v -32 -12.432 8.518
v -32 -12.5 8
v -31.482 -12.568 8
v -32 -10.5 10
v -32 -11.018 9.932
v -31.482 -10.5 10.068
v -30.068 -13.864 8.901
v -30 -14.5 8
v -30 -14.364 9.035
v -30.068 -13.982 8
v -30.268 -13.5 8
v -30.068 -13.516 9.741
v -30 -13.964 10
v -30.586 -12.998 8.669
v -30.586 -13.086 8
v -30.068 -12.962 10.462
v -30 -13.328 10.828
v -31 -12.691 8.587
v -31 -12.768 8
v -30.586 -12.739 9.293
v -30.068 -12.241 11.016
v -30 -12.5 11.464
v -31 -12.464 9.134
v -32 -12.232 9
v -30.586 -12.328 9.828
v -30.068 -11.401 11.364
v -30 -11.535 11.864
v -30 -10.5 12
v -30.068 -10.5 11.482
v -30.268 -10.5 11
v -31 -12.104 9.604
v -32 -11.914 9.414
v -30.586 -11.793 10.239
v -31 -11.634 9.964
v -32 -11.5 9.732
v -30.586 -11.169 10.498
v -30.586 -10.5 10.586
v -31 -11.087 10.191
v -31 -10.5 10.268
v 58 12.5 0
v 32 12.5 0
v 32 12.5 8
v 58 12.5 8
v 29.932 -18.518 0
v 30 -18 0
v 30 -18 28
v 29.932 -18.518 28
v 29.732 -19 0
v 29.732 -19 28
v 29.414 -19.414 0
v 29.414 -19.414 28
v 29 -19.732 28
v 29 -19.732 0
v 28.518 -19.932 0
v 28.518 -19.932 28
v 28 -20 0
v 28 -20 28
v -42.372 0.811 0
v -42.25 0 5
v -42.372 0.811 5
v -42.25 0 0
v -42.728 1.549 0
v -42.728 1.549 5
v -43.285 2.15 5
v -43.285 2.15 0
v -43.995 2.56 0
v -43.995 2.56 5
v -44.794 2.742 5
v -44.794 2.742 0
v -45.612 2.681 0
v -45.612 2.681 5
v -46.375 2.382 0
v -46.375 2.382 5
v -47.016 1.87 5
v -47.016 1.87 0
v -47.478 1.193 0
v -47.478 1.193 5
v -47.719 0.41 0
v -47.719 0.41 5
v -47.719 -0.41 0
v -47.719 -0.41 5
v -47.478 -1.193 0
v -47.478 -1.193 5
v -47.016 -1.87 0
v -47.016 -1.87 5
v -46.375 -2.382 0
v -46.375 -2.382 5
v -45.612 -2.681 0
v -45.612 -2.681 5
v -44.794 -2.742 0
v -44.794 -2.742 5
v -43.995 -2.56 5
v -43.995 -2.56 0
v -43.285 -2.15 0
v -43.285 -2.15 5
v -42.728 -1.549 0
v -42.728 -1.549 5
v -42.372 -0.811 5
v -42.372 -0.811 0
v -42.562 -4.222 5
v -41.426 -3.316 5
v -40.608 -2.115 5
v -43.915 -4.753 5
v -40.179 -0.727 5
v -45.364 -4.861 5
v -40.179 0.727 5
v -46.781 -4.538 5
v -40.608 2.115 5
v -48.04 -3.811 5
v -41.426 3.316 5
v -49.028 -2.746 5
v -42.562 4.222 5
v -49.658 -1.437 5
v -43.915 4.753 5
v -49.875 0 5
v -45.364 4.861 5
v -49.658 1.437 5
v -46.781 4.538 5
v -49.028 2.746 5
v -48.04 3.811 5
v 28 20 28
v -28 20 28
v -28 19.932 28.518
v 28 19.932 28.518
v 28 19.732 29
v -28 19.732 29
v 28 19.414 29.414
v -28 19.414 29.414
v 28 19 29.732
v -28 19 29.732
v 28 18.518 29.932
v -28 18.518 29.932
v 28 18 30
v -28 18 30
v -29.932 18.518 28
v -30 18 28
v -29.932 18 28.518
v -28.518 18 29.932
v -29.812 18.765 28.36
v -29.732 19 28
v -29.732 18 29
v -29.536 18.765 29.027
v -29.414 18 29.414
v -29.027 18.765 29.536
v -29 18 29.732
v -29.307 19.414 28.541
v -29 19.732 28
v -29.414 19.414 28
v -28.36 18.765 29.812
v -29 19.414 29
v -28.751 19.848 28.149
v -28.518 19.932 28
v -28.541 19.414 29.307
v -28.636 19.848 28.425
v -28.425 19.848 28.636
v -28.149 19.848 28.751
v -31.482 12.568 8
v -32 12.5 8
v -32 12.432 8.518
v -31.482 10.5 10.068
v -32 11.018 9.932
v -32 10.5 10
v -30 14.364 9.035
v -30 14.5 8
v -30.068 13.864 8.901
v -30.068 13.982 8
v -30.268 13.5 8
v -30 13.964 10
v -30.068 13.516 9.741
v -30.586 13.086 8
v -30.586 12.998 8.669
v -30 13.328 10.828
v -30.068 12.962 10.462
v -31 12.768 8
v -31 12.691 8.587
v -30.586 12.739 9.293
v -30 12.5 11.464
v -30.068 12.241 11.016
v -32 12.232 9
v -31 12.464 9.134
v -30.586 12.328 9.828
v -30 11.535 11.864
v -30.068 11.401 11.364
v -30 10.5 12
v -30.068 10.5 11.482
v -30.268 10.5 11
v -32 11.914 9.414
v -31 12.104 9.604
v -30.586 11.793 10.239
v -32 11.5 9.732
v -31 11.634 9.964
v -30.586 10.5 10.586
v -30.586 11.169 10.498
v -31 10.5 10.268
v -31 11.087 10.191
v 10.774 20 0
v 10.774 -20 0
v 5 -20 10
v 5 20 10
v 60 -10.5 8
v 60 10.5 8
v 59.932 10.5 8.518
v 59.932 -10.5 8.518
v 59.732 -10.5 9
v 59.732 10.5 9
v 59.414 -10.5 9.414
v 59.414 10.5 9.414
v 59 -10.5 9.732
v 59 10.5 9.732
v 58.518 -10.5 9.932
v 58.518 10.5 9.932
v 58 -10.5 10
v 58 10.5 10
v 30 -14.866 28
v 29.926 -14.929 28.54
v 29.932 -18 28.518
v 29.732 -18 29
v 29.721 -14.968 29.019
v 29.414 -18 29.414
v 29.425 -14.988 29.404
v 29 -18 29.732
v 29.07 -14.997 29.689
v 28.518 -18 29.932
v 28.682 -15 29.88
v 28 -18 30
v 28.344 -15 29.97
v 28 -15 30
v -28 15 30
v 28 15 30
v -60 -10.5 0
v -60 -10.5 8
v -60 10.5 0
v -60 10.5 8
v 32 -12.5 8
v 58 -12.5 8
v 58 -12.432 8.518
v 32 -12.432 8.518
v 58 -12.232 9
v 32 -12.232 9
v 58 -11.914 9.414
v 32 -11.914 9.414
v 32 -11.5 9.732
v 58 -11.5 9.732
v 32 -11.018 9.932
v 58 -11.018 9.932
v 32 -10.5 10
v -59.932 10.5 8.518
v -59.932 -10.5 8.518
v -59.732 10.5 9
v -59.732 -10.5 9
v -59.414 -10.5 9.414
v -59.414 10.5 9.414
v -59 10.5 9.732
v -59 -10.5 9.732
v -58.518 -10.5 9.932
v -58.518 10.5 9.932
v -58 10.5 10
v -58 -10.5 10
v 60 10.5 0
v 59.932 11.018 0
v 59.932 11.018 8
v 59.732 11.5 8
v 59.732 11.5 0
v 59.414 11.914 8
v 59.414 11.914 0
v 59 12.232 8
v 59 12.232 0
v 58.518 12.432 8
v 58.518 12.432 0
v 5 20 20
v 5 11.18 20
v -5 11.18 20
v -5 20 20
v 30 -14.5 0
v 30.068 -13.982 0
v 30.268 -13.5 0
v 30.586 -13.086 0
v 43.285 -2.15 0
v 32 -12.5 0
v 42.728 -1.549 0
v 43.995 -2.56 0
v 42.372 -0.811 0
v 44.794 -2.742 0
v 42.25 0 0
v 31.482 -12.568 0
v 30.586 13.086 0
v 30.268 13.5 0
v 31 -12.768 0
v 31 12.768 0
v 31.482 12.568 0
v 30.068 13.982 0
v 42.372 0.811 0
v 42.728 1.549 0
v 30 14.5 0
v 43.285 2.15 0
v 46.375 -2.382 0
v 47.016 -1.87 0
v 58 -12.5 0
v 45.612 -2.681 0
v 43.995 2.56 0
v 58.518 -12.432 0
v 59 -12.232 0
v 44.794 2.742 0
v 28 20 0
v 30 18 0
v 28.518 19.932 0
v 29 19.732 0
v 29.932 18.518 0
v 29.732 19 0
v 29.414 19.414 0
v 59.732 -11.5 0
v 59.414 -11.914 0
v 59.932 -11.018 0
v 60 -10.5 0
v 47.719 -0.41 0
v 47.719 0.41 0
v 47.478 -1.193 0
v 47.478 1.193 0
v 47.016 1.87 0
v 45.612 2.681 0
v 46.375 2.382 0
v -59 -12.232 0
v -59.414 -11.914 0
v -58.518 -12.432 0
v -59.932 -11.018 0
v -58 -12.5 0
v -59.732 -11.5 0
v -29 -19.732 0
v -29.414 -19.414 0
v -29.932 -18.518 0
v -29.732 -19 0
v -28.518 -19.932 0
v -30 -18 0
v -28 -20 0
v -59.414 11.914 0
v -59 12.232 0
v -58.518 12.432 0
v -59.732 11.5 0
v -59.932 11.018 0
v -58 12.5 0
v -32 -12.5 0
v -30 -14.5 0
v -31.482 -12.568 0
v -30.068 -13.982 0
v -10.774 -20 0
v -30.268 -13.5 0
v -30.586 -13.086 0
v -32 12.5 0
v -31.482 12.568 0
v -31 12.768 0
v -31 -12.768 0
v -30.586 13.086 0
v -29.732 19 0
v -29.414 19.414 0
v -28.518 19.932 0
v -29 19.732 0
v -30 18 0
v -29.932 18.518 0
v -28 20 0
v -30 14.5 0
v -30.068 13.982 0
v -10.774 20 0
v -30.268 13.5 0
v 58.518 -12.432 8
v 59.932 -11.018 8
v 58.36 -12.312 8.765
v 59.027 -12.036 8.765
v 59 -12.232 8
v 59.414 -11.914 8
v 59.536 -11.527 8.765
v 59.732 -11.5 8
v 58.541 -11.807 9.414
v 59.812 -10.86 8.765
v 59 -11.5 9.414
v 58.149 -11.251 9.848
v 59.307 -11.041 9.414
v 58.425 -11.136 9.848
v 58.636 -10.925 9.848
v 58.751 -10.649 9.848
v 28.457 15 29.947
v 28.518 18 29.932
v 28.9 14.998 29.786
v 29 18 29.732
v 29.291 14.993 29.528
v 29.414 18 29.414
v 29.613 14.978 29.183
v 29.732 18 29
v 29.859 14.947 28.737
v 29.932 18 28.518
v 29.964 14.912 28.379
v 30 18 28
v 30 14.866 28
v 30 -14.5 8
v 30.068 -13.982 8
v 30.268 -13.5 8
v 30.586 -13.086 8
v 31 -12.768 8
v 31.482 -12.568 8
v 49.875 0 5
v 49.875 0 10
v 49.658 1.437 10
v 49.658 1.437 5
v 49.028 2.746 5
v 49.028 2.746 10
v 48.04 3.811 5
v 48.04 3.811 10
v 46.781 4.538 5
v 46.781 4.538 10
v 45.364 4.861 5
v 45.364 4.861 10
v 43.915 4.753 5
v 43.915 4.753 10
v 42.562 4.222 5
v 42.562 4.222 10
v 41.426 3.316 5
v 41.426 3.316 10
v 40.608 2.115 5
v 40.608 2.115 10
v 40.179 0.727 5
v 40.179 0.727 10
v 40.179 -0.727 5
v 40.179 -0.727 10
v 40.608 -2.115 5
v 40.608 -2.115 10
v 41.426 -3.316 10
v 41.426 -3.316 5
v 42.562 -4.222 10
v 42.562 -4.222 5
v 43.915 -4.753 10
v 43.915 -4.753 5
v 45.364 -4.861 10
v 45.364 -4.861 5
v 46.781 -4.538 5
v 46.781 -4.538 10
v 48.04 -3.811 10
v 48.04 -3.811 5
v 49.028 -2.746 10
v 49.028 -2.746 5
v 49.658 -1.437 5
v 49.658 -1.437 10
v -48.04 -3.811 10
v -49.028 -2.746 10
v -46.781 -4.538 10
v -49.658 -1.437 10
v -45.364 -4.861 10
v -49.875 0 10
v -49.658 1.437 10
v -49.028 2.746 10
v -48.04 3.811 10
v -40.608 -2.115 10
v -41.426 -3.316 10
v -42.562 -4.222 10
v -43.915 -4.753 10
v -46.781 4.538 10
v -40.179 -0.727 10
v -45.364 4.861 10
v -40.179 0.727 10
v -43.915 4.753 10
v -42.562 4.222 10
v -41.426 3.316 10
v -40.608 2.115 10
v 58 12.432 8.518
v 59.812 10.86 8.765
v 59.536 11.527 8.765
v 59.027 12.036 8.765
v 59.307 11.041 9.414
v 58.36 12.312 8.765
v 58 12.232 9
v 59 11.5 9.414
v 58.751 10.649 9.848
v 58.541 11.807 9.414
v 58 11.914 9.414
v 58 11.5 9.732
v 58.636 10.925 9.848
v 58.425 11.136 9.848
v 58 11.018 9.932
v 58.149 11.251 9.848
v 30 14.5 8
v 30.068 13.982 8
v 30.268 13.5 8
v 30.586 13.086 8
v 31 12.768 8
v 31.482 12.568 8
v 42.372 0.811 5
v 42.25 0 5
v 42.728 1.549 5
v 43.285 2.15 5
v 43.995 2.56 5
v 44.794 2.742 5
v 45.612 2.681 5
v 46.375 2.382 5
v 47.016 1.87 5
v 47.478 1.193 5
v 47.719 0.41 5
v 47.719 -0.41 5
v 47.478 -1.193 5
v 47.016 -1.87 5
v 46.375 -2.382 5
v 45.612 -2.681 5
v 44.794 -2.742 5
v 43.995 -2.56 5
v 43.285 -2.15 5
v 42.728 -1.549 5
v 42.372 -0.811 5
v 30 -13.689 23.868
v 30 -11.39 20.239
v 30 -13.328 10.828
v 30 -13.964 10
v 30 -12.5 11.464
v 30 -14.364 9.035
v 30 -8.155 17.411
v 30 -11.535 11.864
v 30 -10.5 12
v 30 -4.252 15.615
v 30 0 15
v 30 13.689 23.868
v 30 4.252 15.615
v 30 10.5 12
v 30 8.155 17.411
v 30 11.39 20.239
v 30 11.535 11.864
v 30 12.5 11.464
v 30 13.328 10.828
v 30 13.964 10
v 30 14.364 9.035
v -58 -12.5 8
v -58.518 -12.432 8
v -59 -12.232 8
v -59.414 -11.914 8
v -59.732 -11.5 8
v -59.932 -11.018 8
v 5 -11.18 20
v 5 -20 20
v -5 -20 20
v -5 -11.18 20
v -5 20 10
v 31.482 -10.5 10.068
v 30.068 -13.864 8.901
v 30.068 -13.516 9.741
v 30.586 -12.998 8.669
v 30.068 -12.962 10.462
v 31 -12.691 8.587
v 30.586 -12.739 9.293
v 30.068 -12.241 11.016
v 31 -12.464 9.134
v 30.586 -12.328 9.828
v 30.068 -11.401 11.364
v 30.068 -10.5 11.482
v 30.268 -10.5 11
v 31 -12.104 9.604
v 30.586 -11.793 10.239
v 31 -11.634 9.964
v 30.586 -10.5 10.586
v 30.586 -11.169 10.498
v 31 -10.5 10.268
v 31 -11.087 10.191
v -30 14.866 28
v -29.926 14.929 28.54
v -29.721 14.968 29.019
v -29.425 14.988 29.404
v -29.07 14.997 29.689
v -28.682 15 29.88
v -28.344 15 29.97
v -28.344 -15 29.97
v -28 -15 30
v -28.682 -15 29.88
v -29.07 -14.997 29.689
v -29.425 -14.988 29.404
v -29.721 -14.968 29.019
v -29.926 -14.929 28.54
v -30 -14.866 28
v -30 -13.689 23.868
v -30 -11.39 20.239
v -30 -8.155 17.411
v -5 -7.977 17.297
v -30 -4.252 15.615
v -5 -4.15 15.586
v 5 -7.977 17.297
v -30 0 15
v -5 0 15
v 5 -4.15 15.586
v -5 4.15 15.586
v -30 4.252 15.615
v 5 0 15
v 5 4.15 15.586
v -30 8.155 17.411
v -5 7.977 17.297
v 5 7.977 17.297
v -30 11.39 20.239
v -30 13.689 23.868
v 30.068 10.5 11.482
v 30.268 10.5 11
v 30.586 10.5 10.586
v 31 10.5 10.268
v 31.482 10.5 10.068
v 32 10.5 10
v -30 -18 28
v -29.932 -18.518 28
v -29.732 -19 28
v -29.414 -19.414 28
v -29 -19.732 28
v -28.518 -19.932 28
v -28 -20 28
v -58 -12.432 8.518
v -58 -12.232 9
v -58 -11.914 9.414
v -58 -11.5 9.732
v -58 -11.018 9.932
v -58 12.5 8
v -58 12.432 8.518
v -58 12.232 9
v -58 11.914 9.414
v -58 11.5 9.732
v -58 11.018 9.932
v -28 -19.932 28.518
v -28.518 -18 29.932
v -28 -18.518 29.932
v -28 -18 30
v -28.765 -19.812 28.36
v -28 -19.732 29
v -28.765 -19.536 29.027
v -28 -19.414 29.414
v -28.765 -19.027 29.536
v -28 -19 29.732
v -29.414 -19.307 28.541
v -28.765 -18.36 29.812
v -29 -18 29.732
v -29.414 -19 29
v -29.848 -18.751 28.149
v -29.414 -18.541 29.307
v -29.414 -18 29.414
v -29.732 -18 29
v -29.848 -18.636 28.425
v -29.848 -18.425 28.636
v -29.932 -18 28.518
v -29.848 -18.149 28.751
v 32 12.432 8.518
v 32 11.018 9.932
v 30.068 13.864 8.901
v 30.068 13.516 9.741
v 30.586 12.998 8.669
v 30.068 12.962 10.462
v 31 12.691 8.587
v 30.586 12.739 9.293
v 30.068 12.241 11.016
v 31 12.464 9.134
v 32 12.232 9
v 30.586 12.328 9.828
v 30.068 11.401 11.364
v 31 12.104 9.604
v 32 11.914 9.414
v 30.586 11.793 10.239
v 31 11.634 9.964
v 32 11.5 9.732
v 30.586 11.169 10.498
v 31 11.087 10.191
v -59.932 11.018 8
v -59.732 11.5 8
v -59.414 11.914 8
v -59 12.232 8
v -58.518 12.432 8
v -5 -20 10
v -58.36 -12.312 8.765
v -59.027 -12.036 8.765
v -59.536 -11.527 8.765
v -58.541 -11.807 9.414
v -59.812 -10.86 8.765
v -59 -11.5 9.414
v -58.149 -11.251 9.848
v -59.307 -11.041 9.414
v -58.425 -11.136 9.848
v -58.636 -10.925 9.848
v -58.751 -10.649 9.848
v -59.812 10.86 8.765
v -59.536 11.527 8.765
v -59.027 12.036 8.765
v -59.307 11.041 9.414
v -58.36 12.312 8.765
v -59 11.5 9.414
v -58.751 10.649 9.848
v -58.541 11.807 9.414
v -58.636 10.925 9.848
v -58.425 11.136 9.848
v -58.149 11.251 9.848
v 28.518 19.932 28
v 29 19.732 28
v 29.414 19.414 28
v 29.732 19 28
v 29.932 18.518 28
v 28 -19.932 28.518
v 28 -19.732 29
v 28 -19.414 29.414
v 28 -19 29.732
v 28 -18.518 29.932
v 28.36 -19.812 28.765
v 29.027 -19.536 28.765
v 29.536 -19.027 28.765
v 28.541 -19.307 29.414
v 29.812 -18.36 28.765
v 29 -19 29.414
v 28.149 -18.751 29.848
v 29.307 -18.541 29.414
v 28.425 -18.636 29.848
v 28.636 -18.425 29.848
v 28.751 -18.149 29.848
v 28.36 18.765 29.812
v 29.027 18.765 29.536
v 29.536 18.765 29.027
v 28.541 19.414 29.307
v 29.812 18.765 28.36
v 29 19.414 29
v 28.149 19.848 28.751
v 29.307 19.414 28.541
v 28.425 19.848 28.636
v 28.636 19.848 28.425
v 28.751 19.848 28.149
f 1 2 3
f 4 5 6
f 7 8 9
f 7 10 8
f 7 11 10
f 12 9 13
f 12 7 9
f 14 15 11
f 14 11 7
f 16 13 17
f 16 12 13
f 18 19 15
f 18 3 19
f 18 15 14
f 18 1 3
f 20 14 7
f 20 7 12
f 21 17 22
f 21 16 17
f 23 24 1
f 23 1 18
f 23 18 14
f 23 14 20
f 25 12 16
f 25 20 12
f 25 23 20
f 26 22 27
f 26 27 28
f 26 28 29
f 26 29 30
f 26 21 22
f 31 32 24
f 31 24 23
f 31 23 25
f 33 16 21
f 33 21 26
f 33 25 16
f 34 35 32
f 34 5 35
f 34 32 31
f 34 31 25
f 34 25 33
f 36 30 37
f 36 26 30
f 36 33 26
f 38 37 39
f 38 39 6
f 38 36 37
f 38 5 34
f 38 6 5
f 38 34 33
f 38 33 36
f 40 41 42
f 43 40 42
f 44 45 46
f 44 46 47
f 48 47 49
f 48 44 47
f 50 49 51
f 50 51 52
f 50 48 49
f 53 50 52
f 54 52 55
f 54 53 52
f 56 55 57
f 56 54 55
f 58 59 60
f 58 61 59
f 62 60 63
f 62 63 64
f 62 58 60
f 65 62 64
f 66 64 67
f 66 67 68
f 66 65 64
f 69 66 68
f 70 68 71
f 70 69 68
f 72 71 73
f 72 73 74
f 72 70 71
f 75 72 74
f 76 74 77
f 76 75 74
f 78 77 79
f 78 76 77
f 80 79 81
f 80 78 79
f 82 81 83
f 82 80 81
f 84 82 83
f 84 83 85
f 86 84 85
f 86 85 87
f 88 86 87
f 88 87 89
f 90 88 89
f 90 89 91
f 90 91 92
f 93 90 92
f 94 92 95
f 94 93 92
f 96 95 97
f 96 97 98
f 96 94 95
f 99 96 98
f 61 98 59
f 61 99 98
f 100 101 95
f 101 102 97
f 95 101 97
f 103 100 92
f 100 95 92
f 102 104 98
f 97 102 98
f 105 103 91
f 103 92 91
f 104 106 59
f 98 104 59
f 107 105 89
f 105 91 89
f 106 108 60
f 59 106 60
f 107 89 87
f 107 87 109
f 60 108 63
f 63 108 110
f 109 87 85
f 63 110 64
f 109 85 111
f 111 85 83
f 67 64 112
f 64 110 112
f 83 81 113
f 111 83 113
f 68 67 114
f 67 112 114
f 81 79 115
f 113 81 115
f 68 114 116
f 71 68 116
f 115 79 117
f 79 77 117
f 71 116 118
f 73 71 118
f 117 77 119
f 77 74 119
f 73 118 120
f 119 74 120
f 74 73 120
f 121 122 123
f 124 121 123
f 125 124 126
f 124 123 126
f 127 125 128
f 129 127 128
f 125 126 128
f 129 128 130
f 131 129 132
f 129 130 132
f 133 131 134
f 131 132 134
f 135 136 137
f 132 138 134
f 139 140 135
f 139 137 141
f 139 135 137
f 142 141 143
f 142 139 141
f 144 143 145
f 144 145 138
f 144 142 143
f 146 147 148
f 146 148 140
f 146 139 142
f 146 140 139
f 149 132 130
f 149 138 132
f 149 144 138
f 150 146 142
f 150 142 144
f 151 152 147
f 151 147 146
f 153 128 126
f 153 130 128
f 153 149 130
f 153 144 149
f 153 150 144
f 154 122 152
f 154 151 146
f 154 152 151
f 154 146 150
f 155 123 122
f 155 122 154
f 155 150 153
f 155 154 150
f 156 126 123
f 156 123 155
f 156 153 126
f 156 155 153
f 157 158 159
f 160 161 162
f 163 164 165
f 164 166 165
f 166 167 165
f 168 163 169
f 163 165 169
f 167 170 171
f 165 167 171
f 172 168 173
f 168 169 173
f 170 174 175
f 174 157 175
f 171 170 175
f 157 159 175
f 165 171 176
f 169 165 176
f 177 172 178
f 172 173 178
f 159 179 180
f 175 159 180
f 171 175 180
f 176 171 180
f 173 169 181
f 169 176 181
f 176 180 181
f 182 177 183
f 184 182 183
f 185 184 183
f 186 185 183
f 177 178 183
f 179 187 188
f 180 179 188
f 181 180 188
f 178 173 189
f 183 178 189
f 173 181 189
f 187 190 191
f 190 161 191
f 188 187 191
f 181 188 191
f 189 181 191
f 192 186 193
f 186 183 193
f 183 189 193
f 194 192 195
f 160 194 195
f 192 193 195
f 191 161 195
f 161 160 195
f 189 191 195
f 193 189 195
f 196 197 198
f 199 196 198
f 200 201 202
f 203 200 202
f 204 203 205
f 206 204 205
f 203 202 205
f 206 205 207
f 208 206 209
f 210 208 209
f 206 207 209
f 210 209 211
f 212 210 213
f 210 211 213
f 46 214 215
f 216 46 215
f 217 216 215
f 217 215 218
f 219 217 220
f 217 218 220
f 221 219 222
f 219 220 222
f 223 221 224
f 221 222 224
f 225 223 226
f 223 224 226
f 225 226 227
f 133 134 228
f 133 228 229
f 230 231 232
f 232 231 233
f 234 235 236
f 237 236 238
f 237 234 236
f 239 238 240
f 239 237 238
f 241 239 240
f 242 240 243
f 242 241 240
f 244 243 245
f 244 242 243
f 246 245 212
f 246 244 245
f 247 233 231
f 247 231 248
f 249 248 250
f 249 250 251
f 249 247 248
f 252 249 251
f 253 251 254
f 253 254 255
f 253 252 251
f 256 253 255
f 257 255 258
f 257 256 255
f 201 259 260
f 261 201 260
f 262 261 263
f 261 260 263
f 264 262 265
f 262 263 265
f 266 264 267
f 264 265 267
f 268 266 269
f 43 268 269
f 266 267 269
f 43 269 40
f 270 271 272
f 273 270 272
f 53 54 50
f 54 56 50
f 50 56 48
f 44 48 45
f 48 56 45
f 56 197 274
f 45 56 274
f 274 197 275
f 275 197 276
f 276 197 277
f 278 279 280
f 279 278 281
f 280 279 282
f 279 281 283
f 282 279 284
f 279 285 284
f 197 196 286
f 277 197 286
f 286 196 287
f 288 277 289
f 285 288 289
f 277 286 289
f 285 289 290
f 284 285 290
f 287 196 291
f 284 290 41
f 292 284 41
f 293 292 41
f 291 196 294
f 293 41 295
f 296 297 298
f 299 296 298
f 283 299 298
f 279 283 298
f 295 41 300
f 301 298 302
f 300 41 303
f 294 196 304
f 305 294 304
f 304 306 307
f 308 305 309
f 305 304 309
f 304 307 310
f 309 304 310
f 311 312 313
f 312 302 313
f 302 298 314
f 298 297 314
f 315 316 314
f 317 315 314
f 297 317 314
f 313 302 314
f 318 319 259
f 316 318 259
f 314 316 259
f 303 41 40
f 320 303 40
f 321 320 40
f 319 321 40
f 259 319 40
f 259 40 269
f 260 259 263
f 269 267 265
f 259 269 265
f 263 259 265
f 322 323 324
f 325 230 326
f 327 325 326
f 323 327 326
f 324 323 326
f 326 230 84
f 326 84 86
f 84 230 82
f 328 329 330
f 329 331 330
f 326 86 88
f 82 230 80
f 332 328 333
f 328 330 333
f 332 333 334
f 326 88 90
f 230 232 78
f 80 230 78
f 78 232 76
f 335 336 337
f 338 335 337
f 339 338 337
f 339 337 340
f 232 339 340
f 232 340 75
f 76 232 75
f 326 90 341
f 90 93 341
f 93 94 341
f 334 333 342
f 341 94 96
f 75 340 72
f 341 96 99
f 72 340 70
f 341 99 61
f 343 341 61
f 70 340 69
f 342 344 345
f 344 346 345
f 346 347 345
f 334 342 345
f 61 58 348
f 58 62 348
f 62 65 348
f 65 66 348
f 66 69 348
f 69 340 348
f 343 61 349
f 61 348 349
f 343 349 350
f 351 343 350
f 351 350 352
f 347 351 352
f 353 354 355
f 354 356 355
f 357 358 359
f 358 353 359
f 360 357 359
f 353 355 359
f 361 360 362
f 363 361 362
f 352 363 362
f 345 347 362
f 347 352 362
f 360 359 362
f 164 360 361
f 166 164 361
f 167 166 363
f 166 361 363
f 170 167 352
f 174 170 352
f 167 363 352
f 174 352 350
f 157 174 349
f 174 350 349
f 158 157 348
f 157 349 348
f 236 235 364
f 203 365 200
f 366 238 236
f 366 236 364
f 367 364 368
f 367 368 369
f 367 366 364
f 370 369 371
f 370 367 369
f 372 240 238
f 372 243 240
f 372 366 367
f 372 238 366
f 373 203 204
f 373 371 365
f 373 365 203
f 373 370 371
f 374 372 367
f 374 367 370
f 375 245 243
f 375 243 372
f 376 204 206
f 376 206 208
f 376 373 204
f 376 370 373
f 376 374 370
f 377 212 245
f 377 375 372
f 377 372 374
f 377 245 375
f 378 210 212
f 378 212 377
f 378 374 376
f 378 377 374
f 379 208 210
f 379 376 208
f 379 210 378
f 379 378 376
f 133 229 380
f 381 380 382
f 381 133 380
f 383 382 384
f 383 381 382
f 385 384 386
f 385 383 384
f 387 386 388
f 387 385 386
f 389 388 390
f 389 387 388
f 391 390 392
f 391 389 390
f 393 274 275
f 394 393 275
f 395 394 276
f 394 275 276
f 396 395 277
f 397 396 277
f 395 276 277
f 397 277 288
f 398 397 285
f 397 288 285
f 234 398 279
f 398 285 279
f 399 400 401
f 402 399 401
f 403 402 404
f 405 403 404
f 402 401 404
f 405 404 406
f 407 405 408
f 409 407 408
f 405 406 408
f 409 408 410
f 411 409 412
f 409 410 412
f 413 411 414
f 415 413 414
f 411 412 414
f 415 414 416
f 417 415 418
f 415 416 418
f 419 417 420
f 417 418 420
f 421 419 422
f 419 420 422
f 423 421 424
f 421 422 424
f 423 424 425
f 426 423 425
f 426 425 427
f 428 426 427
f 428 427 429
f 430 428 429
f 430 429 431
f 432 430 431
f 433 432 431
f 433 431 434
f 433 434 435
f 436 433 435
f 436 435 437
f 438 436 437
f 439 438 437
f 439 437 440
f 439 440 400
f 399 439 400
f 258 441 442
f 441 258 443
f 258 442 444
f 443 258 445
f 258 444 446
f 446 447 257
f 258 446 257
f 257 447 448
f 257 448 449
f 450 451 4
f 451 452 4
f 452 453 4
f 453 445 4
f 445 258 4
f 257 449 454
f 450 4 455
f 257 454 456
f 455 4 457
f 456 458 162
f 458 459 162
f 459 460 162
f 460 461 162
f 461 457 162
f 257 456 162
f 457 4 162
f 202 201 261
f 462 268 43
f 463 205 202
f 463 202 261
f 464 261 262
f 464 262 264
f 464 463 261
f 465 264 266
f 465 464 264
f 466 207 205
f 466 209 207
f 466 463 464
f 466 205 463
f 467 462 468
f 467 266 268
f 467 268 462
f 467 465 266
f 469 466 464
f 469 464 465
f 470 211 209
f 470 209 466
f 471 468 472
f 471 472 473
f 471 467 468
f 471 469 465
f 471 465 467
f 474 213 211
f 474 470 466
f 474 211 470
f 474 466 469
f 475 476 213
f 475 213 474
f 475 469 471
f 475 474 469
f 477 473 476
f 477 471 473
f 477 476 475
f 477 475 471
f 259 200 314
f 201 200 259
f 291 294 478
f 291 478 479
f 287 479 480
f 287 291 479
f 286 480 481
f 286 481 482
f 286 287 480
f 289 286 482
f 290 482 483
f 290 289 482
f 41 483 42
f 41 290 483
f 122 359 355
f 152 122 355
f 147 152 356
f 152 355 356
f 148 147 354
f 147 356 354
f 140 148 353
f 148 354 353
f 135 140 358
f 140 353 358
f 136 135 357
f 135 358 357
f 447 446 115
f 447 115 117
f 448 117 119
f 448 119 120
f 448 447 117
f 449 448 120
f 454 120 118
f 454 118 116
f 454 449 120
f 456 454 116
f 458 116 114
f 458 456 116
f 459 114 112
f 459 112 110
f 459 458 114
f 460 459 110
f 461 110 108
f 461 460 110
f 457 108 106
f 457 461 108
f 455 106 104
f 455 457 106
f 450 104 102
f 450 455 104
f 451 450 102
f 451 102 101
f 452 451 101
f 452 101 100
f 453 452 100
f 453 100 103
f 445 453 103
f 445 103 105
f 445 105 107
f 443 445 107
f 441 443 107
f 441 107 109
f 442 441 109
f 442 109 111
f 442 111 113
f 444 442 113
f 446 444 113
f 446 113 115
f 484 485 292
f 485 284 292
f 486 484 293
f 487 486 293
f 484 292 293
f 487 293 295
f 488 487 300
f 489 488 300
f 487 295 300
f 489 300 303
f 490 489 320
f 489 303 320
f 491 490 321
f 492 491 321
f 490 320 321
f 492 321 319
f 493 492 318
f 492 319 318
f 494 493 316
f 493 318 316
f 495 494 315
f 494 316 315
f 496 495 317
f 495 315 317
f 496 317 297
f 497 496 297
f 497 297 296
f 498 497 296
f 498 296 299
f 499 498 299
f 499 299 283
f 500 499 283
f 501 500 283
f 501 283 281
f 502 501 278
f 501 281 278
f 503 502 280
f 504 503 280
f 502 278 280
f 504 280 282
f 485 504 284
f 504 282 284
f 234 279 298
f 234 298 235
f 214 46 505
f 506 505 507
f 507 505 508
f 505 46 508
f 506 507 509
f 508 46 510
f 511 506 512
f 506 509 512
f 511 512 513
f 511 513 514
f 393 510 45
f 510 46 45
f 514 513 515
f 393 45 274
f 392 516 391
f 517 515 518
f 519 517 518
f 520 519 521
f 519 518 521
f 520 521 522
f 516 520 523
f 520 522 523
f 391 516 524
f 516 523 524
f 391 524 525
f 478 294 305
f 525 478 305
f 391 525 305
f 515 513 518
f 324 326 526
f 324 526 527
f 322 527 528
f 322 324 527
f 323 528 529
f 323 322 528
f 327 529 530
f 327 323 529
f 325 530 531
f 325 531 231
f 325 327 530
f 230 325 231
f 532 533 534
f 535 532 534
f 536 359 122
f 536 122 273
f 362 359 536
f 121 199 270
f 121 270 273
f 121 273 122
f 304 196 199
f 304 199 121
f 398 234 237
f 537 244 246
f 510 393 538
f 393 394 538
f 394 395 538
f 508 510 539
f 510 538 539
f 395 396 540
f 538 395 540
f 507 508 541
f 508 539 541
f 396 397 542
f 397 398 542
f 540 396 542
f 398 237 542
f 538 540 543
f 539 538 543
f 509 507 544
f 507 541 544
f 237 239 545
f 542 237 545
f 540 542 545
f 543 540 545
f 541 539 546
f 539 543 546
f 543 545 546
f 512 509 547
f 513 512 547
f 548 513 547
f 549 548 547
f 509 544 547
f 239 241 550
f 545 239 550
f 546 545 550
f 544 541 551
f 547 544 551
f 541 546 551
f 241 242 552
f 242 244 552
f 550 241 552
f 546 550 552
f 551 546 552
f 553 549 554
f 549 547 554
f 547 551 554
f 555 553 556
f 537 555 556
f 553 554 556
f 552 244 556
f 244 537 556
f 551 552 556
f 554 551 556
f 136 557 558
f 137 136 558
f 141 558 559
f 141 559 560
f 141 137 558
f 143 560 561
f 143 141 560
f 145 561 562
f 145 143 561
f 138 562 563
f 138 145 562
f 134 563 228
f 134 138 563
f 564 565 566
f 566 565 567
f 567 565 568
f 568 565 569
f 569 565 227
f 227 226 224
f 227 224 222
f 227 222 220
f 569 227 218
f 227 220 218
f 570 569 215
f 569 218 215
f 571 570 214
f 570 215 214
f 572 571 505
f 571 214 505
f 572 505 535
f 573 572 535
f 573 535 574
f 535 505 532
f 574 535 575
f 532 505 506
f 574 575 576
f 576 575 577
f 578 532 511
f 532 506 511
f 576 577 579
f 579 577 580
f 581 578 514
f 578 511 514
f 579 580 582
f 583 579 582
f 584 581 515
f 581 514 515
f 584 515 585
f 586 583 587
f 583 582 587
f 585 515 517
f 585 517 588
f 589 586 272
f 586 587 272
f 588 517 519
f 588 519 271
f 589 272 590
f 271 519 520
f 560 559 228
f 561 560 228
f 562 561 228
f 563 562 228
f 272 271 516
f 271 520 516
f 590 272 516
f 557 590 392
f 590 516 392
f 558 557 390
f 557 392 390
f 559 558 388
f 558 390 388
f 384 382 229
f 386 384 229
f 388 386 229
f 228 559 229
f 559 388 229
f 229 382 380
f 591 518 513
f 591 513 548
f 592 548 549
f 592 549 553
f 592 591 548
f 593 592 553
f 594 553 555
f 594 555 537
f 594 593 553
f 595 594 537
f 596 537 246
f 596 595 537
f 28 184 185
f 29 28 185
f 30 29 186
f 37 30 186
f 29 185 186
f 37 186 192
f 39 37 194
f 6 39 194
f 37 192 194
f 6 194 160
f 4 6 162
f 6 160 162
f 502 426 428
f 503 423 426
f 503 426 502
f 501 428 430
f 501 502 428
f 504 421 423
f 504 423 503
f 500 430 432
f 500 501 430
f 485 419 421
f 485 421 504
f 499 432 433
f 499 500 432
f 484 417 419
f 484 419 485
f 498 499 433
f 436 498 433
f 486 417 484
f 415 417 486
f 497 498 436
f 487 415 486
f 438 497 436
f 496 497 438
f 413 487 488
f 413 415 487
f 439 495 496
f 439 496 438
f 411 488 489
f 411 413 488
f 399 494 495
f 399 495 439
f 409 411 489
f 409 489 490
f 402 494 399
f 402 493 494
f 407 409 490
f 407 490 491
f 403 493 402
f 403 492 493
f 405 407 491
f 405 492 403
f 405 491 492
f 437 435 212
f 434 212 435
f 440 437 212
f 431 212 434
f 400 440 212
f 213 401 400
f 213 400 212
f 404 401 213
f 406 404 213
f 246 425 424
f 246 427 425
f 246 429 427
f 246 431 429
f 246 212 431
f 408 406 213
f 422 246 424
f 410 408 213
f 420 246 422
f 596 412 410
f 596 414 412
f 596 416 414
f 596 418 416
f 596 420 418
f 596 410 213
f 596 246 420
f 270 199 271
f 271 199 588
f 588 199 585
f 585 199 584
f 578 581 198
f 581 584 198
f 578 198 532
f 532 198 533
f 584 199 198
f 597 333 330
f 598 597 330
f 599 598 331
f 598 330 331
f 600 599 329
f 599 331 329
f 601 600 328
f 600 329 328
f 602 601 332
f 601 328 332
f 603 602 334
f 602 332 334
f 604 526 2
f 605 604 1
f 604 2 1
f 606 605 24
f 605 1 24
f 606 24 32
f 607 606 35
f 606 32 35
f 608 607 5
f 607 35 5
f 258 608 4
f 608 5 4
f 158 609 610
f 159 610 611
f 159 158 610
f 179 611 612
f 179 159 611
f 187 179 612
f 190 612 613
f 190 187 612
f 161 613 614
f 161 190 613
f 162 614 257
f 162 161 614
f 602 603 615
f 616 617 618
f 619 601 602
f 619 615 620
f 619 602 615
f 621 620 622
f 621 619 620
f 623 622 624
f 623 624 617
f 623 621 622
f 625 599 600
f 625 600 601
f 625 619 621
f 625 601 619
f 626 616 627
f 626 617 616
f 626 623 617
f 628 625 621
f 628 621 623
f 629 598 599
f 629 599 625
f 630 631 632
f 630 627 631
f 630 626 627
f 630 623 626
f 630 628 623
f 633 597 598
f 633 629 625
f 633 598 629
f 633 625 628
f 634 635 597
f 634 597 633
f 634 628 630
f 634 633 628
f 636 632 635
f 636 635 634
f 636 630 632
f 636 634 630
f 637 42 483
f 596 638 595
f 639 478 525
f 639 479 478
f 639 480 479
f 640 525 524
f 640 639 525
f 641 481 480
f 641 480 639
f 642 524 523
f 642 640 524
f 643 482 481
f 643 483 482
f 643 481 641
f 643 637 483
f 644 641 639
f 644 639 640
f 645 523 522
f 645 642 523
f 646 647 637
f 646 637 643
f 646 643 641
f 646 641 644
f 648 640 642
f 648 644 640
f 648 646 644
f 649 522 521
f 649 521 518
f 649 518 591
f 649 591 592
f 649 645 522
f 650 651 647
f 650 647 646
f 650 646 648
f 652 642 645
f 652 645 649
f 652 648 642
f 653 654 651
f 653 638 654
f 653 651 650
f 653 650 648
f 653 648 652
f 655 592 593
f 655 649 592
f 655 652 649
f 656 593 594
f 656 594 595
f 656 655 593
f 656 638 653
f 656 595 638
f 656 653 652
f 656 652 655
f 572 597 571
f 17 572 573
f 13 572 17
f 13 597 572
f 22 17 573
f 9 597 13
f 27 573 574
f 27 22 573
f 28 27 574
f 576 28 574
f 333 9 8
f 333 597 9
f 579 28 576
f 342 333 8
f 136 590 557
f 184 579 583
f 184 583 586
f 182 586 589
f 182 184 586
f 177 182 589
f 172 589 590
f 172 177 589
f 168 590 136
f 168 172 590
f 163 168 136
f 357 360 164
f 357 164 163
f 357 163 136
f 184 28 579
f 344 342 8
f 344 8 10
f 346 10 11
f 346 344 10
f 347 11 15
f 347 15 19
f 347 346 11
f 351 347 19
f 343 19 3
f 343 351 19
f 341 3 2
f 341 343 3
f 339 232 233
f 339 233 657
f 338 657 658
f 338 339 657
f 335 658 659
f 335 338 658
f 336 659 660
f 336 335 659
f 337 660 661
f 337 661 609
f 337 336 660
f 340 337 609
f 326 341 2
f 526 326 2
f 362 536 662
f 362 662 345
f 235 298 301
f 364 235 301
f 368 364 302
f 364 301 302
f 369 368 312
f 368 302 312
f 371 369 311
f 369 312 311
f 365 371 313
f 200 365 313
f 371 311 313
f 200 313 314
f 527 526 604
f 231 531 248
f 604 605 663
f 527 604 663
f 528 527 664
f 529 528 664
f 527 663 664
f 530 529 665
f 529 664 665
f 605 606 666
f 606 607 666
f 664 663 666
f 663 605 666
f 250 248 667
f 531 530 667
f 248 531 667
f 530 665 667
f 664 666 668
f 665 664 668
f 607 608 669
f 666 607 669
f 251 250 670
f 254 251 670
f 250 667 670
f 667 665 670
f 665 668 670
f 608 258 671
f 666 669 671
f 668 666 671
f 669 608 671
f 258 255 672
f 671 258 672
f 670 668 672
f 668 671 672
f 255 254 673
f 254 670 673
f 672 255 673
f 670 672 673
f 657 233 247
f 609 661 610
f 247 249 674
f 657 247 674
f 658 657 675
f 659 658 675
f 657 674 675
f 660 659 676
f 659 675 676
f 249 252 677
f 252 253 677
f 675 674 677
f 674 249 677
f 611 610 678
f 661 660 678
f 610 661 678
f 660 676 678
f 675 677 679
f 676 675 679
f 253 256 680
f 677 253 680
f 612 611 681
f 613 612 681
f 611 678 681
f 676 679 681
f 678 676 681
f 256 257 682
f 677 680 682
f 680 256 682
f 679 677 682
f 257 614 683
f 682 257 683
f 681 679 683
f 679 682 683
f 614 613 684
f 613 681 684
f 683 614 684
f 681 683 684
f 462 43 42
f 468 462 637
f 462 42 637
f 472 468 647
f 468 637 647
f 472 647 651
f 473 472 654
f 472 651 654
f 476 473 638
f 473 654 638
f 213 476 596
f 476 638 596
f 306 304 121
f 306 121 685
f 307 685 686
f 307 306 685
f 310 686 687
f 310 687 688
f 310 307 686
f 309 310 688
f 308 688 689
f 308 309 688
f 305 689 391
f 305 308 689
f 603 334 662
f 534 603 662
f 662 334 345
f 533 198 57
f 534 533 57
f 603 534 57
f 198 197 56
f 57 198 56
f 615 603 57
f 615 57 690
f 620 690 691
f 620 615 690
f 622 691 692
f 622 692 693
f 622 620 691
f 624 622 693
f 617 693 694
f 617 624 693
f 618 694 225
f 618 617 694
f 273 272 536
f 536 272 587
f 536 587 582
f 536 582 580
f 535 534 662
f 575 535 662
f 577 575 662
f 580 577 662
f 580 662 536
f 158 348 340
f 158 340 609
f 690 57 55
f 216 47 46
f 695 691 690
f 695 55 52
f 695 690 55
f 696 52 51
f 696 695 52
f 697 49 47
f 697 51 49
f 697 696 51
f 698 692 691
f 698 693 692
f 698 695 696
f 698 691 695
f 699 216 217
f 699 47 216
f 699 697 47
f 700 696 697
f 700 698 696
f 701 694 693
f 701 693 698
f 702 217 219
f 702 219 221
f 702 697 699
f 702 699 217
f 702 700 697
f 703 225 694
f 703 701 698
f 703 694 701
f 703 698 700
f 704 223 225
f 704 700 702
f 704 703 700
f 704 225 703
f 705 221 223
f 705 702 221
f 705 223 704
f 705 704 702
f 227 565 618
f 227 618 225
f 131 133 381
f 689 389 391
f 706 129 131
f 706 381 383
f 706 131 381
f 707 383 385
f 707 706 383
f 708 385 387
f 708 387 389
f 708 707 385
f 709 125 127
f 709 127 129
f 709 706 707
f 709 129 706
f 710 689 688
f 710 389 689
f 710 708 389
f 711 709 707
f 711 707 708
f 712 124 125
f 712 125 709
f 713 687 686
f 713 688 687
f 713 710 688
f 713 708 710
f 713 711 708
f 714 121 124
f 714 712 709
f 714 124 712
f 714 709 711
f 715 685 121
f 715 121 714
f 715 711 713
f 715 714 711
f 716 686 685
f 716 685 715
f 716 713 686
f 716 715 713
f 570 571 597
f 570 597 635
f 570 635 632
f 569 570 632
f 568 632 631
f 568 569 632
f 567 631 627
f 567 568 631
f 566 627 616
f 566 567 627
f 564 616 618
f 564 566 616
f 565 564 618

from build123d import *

# Parameters (mm, degrees)
F0_W           = 60
F0_H           = 40
F1_DEPTH       = 30
F3_DEPTH       = 40.001
F4_R           = 15
F5_DEPTH       = 40
F6_W           = 25
F6_H           = 10
F7_DEPTH       = 30
F9_D           = 5.5
F9_CBORE_D     = 9.75
F9_CBORE_DEPTH = 5
F10_T1_DEPTH   = 13
F10_T3_DEPTH   = 28
F10_T5_DEPTH   = 21
F10_T7_DEPTH   = 33
F10_T9_DEPTH   = 8
F10_T11_DEPTH  = 56
F10_T13_DEPTH  = 8
F10_S17_W      = 2
F10_S17_H      = 2
F10_T18_DEPTH  = 2
F10_S23_W      = 2
F10_S23_H      = 2
F10_T24_DEPTH  = 2
F10_S29_W      = 2
F10_S29_H      = 2
F10_T30_DEPTH  = 2
F10_S35_W      = 2
F10_S35_H      = 2
F10_T36_DEPTH  = 2
F10_S41_W      = 2
F10_S41_H      = 2
F10_T42_DEPTH  = 2
F10_S47_W      = 2
F10_S47_H      = 2
F10_T48_DEPTH  = 2
F10_T51_DEPTH  = 8
F10_T53_DEPTH  = 21
F10_T56_ANGLE  = 90
F10_T58_ANGLE  = 90


# Not quite as in the source:
# - a fillet or chamfer that OpenCascade refuses, or shapes differently, is made with other operations: its cross-section is extruded or revolved along the edge and cut away or added


with BuildPart() as f1:
    # F0 (on Top) → F1 (new body)
    with BuildSketch(Plane.XY):
        Rectangle(F0_W, F0_H)
    extrude(amount=F1_DEPTH)

    # F2 (on face) → F3 (cut, through all)
    with BuildSketch(Plane.XZ.offset(20)):
        Polygon((-5, 10), (-10.7735026919, 0), (10.7735026919, 0), (5, 10), (5, 20), (-5, 20), align=None)
    extrude(amount=-F3_DEPTH, mode=Mode.SUBTRACT)

    # F4 (on Right) → F5 (cut, symmetric)
    with BuildSketch(Plane.YZ):
        with Locations((0, 30)):
            Circle(F4_R)
    extrude(amount=F5_DEPTH, both=True, mode=Mode.SUBTRACT)

    # F6 (on face) → F7 (join)
    with BuildSketch(Plane.YZ.offset(30)):
        with Locations((0, 5)):
            Rectangle(F6_W, F6_H)
    extrude(amount=F7_DEPTH)

    # F9 (through all)
    with Locations(Plane.XY.offset(10)):
        with Locations((45, 0)):
            CounterBoreHole(F9_D / 2, F9_CBORE_D / 2, F9_CBORE_DEPTH)

    # F10: fillet of radius 2 on 18 edges, made by hand

    # F10_s2 → F10_t1 (cut)
    with BuildSketch(Plane.XY.offset(-5)):
        with BuildLine():
            ThreePointArc((58, -12.5), (59.4142135624, -11.9142135624), (60, -10.5))
            Line((60, -10.5), (60, -12.5))
            Line((60, -12.5), (58, -12.5))
        make_face()
        with BuildLine():
            ThreePointArc((60, 10.5), (59.4142135624, 11.9142135624), (58, 12.5))
            Line((58, 12.5), (60, 12.5))
            Line((60, 12.5), (60, 10.5))
        make_face()
    extrude(amount=F10_T1_DEPTH, mode=Mode.SUBTRACT)

    # F10_s4 → F10_t3 (cut)
    with BuildSketch(Plane.YZ.offset(30)):
        with BuildLine():
            ThreePointArc((-12.5, 8), (-11.9142135624, 9.4142135624), (-10.5, 10))
            Line((-10.5, 10), (-12.5, 10))
            Line((-12.5, 10), (-12.5, 8))
        make_face()
        with BuildLine():
            ThreePointArc((12.5, 8), (11.9142135624, 9.4142135624), (10.5, 10))
            Line((10.5, 10), (12.5, 10))
            Line((12.5, 10), (12.5, 8))
        make_face()
    extrude(amount=F10_T3_DEPTH, mode=Mode.SUBTRACT)

    # F10_s6 → F10_t5 (cut)
    with BuildSketch(Plane.XZ.offset(-10.5)):
        with BuildLine():
            ThreePointArc((60, 8), (59.4142135624, 9.4142135624), (58, 10))
            Line((58, 10), (60, 10))
            Line((60, 10), (60, 8))
        make_face()
    extrude(amount=F10_T5_DEPTH, mode=Mode.SUBTRACT)

    # F10_s8 → F10_t7 (cut)
    with BuildSketch(Plane.XY.offset(-5)):
        with BuildLine():
            ThreePointArc((30, -18), (29.4142135624, -19.4142135624), (28, -20))
            Line((28, -20), (30, -20))
            Line((30, -20), (30, -18))
        make_face()
        with BuildLine():
            ThreePointArc((28, 20), (29.4142135624, 19.4142135624), (30, 18))
            Line((30, 18), (30, 20))
            Line((30, 20), (28, 20))
        make_face()
        with BuildLine():
            ThreePointArc((-30, -18), (-29.4142135624, -19.4142135624), (-28, -20))
            Line((-28, -20), (-30, -20))
            Line((-30, -20), (-30, -18))
        make_face()
        with BuildLine():
            ThreePointArc((-28, 20), (-29.4142135624, 19.4142135624), (-30, 18))
            Line((-30, 18), (-30, 20))
            Line((-30, 20), (-28, 20))
        make_face()
    extrude(amount=F10_T7_DEPTH, mode=Mode.SUBTRACT)

    # F10_s10 → F10_t9 (cut)
    with BuildSketch(Plane.XZ.offset(10)):
        with BuildLine():
            ThreePointArc((30, 28), (29.4142135624, 29.4142135624), (28, 30))
            Line((28, 30), (30, 30))
            Line((30, 30), (30, 28))
        make_face()
        with BuildLine():
            ThreePointArc((-30, 28), (-29.4142135624, 29.4142135624), (-28, 30))
            Line((-28, 30), (-30, 30))
            Line((-30, 30), (-30, 28))
        make_face()
    extrude(amount=F10_T9_DEPTH, mode=Mode.SUBTRACT)

    # F10_s12 → F10_t11 (cut)
    with BuildSketch(Plane.YZ.offset(-28)):
        with BuildLine():
            ThreePointArc((20, 28), (19.4142135624, 29.4142135624), (18, 30))
            Line((18, 30), (20, 30))
            Line((20, 30), (20, 28))
        make_face()
        with BuildLine():
            ThreePointArc((-20, 28), (-19.4142135624, 29.4142135624), (-18, 30))
            Line((-18, 30), (-20, 30))
            Line((-20, 30), (-20, 28))
        make_face()
    extrude(amount=F10_T11_DEPTH, mode=Mode.SUBTRACT)

    # F10_s14 → F10_t13 (cut)
    with BuildSketch(Plane.XZ.offset(-18)):
        with BuildLine():
            ThreePointArc((-30, 28), (-29.4142135624, 29.4142135624), (-28, 30))
            Line((-28, 30), (-30, 30))
            Line((-30, 30), (-30, 28))
        make_face()
        with BuildLine():
            ThreePointArc((28, 30), (29.4142135624, 29.4142135624), (30, 28))
            Line((30, 28), (30, 30))
            Line((30, 30), (28, 30))
        make_face()
    extrude(amount=F10_T13_DEPTH, mode=Mode.SUBTRACT)


with BuildPart() as f10_tool16:
    # F10_s17 → F10_t18 (new body)
    with BuildSketch(Plane.XY.offset(8)):
        with Locations((59, -11.5)):
            Rectangle(F10_S17_W, F10_S17_H)
    extrude(amount=F10_T18_DEPTH)

    # F10_s19 → F10_t20 (revolve, cut)
    with BuildSketch(Plane(origin=(58, -10.5, 8), x_dir=(-0.7071067812, 0.7071067812, 0), z_dir=(0.7071067812, 0.7071067812, 0))):
        with BuildLine():
            ThreePointArc((0, -2), (2, 0), (0, 2))
            Line((0, 2), (0, -2))
        make_face()
    revolve(axis=Axis((58, -10.5, 8), (0, 0, 1)), mode=Mode.SUBTRACT)


with BuildPart() as f1_1:
    add(f1.part)

    # F10_t15: cut F10_tool16
    add(f10_tool16.part, mode=Mode.SUBTRACT)


with BuildPart() as f10_tool22:
    # F10_s23 → F10_t24 (new body)
    with BuildSketch(Plane.XY.offset(8)):
        with Locations((59, 11.5)):
            Rectangle(F10_S23_W, F10_S23_H)
    extrude(amount=F10_T24_DEPTH)

    # F10_s25 → F10_t26 (revolve, cut)
    with BuildSketch(Plane(origin=(58, 10.5, 8), x_dir=(-0.7071067812, -0.7071067812, 0), z_dir=(-0.7071067812, 0.7071067812, 0))):
        with BuildLine():
            ThreePointArc((0, -2), (2, 0), (0, 2))
            Line((0, 2), (0, -2))
        make_face()
    revolve(axis=Axis((58, 10.5, 8), (0, 0, 1)), mode=Mode.SUBTRACT)


with BuildPart() as f1_2:
    add(f1_1.part)

    # F10_t21: cut F10_tool22
    add(f10_tool22.part, mode=Mode.SUBTRACT)


with BuildPart() as f10_tool28:
    # F10_s29 → F10_t30 (new body)
    with BuildSketch(Plane.XY.offset(28)):
        with Locations((29, -19)):
            Rectangle(F10_S29_W, F10_S29_H)
    extrude(amount=F10_T30_DEPTH)

    # F10_s31 → F10_t32 (revolve, cut)
    with BuildSketch(Plane(origin=(28, -18, 28), x_dir=(-0.7071067812, 0.7071067812, 0), z_dir=(0.7071067812, 0.7071067812, 0))):
        with BuildLine():
            ThreePointArc((0, -2), (2, 0), (0, 2))
            Line((0, 2), (0, -2))
        make_face()
    revolve(axis=Axis((28, -18, 28), (0, 0, 1)), mode=Mode.SUBTRACT)


with BuildPart() as f1_3:
    add(f1_2.part)

    # F10_t27: cut F10_tool28
    add(f10_tool28.part, mode=Mode.SUBTRACT)


with BuildPart() as f10_tool34:
    # F10_s35 → F10_t36 (new body)
    with BuildSketch(Plane.YZ.offset(-28)):
        with Locations((-19, 29)):
            Rectangle(F10_S35_W, F10_S35_H)
    extrude(amount=-F10_T36_DEPTH)

    # F10_s37 → F10_t38 (revolve, cut)
    with BuildSketch(Plane(origin=(-28, -18, 28), x_dir=(0, 0.7071067812, -0.7071067812), z_dir=(0, 0.7071067812, 0.7071067812))):
        with BuildLine():
            ThreePointArc((0, -2), (2, 0), (0, 2))
            Line((0, 2), (0, -2))
        make_face()
    revolve(axis=Axis((-28, -18, 28), (-1, 0, 0)), mode=Mode.SUBTRACT)


with BuildPart() as f1_4:
    add(f1_3.part)

    # F10_t33: cut F10_tool34
    add(f10_tool34.part, mode=Mode.SUBTRACT)


with BuildPart() as f10_tool40:
    # F10_s41 → F10_t42 (new body)
    with BuildSketch(Plane.XZ.offset(-18)):
        with Locations((29, 29)):
            Rectangle(F10_S41_W, F10_S41_H)
    extrude(amount=-F10_T42_DEPTH)

    # F10_s43 → F10_t44 (revolve, cut)
    with BuildSketch(Plane(origin=(28, 18, 28), x_dir=(-0.7071067812, 0, -0.7071067812), z_dir=(0.7071067812, 0, -0.7071067812))):
        with BuildLine():
            ThreePointArc((0, -2), (2, 0), (0, 2))
            Line((0, 2), (0, -2))
        make_face()
    revolve(axis=Axis((28, 18, 28), (0, 1, 0)), mode=Mode.SUBTRACT)


with BuildPart() as f1_5:
    add(f1_4.part)

    # F10_t39: cut F10_tool40
    add(f10_tool40.part, mode=Mode.SUBTRACT)


with BuildPart() as f10_tool46:
    # F10_s47 → F10_t48 (new body)
    with BuildSketch(Plane.XZ.offset(-18)):
        with Locations((-29, 29)):
            Rectangle(F10_S47_W, F10_S47_H)
    extrude(amount=-F10_T48_DEPTH)

    # F10_s49 → F10_t50 (revolve, cut)
    with BuildSketch(Plane(origin=(-28, 18, 28), x_dir=(0.7071067812, 0, -0.7071067812), z_dir=(0.7071067812, 0, 0.7071067812))):
        with BuildLine():
            ThreePointArc((0, -2), (2, 0), (0, 2))
            Line((0, 2), (0, -2))
        make_face()
    revolve(axis=Axis((-28, 18, 28), (0, 1, 0)), mode=Mode.SUBTRACT)


with BuildPart() as f1_6:
    add(f1_5.part)

    # F10_t45: cut F10_tool46
    add(f10_tool46.part, mode=Mode.SUBTRACT)

    # F10_s52 → F10_t51 (join)
    with BuildSketch(Plane.XY):
        with BuildLine():
            ThreePointArc((30, -14.5), (30.5857864376, -13.0857864376), (32, -12.5))
            Line((32, -12.5), (30, -12.5))
            Line((30, -12.5), (30, -14.5))
        make_face()
        with BuildLine():
            ThreePointArc((30, 14.5), (30.5857864376, 13.0857864376), (32, 12.5))
            Line((32, 12.5), (30, 12.5))
            Line((30, 12.5), (30, 14.5))
        make_face()
    extrude(amount=F10_T51_DEPTH)

    # F10_s54 → F10_t53 (join)
    with BuildSketch(Plane.XZ.offset(-10.5)):
        with BuildLine():
            ThreePointArc((30, 12), (30.5857864376, 10.5857864376), (32, 10))
            Line((32, 10), (30, 10))
            Line((30, 10), (30, 12))
        make_face()
    extrude(amount=F10_T53_DEPTH)

    # F10_s55 → F10_t56 (revolve)
    with BuildSketch(Plane.XY.offset(8)):
        with BuildLine():
            ThreePointArc((30, 14.5), (30.5857864376, 13.0857864376), (32, 12.5))
            Line((32, 12.5), (30, 12.5))
            Line((30, 12.5), (30, 14.5))
        make_face()
    revolve(axis=Axis((30, 10.5, 8), (1, 0, 0)), revolution_arc=F10_T56_ANGLE)

    # F10_s57 → F10_t58 (revolve)
    with BuildSketch(Plane.XY.offset(8)):
        with BuildLine():
            ThreePointArc((30, -14.5), (30.5857864376, -13.0857864376), (32, -12.5))
            Line((32, -12.5), (30, -12.5))
            Line((30, -12.5), (30, -14.5))
        make_face()
    revolve(axis=Axis((30, -10.5, 8), (-1, 0, 0)), revolution_arc=F10_T58_ANGLE)

    # F11: F1 across plane


with BuildPart() as f1_7:
    add(f1_6.part)
    add(f1_6.part.mirror(Plane.YZ))


solid = f1_7.part
